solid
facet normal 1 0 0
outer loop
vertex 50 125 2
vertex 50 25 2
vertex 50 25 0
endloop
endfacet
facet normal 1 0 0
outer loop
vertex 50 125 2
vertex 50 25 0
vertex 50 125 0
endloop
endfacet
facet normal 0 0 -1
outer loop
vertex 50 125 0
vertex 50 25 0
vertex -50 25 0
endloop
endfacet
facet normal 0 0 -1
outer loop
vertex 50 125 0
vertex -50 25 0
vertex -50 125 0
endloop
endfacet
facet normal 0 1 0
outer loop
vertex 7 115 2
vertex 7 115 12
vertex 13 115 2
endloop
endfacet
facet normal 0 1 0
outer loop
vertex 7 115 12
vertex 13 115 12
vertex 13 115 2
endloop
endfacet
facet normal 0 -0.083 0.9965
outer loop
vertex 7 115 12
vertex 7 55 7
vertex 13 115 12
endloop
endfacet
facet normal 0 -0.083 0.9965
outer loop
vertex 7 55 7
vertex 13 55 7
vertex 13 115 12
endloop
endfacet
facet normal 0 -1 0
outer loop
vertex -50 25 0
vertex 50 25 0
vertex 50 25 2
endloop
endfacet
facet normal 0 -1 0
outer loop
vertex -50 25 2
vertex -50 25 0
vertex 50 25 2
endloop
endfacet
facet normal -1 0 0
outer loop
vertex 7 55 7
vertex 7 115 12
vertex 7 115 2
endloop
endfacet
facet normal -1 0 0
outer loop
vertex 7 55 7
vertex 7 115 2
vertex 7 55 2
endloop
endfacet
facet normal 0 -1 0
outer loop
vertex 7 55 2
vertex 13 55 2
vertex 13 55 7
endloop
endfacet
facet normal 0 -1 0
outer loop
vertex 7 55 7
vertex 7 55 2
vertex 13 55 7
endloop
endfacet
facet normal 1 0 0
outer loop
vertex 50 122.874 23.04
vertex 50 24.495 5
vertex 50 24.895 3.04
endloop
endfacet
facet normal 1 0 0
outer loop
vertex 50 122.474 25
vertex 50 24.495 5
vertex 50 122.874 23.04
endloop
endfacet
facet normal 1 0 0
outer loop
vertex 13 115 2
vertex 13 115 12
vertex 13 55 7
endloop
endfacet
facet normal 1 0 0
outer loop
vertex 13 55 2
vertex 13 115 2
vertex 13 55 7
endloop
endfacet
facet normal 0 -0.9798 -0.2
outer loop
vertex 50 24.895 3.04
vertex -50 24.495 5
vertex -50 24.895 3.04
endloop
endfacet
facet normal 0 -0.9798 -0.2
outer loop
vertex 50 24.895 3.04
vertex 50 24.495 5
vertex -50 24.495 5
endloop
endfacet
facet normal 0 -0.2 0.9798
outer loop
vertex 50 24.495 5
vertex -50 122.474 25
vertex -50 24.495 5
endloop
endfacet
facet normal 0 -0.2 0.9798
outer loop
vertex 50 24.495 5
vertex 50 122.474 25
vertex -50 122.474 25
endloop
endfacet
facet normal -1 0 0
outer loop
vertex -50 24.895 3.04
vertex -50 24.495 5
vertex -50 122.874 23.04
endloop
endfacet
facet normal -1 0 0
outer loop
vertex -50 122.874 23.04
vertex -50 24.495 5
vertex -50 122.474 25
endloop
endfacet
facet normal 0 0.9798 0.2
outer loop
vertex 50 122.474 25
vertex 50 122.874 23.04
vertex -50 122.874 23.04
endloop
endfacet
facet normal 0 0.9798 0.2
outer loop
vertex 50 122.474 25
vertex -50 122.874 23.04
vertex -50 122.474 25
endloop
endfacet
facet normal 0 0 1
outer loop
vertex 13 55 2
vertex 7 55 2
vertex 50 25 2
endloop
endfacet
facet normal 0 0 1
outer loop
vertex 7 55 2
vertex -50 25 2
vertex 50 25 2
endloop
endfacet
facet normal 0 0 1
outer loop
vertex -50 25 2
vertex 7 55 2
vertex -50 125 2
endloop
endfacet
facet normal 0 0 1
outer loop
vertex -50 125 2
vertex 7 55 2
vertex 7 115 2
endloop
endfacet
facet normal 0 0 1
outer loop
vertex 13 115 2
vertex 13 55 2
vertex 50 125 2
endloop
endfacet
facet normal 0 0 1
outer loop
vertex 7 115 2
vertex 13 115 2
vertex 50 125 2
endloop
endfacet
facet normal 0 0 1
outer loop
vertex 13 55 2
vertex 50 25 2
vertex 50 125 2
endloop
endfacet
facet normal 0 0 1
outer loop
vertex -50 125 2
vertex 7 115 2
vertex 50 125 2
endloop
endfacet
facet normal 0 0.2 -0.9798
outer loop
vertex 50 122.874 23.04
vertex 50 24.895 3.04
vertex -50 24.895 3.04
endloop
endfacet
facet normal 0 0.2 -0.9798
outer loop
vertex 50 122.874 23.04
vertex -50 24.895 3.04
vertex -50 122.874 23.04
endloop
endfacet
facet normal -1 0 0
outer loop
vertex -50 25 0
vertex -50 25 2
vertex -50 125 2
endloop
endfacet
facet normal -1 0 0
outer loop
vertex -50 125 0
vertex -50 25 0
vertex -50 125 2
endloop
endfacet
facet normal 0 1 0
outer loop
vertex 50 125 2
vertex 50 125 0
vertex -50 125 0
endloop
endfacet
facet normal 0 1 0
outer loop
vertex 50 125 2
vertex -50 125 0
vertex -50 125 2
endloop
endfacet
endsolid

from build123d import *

# Parameters (mm, degrees)
PAD_DEPTH    = 50
SKETCH003_W  = 100
SKETCH003_H  = 2
PAD001_DEPTH = 50
PAD003_DEPTH = 3


with BuildPart() as part:
    # Sketch001 → Pad (new body, symmetric)
    with BuildSketch(Plane.YZ):
        Polygon((24.494897, 5), (24.894897, 3.040408), (122.874487, 23.040408), (122.474487, 25), align=None)
    extrude(amount=PAD_DEPTH, both=True)

    # Sketch003 → Pad001 (join, symmetric)
    with BuildSketch(Plane.YZ):
        with Locations((75, 1)):
            Rectangle(SKETCH003_W, SKETCH003_H)
    extrude(amount=PAD001_DEPTH, both=True)

    # Sketch005 (on DatumPlane) → Pad003 (join, symmetric)
    with BuildSketch(Plane.YZ.offset(10)):
        Polygon((55, 2), (55, 7), (115, 12), (115, 2), align=None)
    extrude(amount=PAD003_DEPTH, both=True)


solid = part.part
